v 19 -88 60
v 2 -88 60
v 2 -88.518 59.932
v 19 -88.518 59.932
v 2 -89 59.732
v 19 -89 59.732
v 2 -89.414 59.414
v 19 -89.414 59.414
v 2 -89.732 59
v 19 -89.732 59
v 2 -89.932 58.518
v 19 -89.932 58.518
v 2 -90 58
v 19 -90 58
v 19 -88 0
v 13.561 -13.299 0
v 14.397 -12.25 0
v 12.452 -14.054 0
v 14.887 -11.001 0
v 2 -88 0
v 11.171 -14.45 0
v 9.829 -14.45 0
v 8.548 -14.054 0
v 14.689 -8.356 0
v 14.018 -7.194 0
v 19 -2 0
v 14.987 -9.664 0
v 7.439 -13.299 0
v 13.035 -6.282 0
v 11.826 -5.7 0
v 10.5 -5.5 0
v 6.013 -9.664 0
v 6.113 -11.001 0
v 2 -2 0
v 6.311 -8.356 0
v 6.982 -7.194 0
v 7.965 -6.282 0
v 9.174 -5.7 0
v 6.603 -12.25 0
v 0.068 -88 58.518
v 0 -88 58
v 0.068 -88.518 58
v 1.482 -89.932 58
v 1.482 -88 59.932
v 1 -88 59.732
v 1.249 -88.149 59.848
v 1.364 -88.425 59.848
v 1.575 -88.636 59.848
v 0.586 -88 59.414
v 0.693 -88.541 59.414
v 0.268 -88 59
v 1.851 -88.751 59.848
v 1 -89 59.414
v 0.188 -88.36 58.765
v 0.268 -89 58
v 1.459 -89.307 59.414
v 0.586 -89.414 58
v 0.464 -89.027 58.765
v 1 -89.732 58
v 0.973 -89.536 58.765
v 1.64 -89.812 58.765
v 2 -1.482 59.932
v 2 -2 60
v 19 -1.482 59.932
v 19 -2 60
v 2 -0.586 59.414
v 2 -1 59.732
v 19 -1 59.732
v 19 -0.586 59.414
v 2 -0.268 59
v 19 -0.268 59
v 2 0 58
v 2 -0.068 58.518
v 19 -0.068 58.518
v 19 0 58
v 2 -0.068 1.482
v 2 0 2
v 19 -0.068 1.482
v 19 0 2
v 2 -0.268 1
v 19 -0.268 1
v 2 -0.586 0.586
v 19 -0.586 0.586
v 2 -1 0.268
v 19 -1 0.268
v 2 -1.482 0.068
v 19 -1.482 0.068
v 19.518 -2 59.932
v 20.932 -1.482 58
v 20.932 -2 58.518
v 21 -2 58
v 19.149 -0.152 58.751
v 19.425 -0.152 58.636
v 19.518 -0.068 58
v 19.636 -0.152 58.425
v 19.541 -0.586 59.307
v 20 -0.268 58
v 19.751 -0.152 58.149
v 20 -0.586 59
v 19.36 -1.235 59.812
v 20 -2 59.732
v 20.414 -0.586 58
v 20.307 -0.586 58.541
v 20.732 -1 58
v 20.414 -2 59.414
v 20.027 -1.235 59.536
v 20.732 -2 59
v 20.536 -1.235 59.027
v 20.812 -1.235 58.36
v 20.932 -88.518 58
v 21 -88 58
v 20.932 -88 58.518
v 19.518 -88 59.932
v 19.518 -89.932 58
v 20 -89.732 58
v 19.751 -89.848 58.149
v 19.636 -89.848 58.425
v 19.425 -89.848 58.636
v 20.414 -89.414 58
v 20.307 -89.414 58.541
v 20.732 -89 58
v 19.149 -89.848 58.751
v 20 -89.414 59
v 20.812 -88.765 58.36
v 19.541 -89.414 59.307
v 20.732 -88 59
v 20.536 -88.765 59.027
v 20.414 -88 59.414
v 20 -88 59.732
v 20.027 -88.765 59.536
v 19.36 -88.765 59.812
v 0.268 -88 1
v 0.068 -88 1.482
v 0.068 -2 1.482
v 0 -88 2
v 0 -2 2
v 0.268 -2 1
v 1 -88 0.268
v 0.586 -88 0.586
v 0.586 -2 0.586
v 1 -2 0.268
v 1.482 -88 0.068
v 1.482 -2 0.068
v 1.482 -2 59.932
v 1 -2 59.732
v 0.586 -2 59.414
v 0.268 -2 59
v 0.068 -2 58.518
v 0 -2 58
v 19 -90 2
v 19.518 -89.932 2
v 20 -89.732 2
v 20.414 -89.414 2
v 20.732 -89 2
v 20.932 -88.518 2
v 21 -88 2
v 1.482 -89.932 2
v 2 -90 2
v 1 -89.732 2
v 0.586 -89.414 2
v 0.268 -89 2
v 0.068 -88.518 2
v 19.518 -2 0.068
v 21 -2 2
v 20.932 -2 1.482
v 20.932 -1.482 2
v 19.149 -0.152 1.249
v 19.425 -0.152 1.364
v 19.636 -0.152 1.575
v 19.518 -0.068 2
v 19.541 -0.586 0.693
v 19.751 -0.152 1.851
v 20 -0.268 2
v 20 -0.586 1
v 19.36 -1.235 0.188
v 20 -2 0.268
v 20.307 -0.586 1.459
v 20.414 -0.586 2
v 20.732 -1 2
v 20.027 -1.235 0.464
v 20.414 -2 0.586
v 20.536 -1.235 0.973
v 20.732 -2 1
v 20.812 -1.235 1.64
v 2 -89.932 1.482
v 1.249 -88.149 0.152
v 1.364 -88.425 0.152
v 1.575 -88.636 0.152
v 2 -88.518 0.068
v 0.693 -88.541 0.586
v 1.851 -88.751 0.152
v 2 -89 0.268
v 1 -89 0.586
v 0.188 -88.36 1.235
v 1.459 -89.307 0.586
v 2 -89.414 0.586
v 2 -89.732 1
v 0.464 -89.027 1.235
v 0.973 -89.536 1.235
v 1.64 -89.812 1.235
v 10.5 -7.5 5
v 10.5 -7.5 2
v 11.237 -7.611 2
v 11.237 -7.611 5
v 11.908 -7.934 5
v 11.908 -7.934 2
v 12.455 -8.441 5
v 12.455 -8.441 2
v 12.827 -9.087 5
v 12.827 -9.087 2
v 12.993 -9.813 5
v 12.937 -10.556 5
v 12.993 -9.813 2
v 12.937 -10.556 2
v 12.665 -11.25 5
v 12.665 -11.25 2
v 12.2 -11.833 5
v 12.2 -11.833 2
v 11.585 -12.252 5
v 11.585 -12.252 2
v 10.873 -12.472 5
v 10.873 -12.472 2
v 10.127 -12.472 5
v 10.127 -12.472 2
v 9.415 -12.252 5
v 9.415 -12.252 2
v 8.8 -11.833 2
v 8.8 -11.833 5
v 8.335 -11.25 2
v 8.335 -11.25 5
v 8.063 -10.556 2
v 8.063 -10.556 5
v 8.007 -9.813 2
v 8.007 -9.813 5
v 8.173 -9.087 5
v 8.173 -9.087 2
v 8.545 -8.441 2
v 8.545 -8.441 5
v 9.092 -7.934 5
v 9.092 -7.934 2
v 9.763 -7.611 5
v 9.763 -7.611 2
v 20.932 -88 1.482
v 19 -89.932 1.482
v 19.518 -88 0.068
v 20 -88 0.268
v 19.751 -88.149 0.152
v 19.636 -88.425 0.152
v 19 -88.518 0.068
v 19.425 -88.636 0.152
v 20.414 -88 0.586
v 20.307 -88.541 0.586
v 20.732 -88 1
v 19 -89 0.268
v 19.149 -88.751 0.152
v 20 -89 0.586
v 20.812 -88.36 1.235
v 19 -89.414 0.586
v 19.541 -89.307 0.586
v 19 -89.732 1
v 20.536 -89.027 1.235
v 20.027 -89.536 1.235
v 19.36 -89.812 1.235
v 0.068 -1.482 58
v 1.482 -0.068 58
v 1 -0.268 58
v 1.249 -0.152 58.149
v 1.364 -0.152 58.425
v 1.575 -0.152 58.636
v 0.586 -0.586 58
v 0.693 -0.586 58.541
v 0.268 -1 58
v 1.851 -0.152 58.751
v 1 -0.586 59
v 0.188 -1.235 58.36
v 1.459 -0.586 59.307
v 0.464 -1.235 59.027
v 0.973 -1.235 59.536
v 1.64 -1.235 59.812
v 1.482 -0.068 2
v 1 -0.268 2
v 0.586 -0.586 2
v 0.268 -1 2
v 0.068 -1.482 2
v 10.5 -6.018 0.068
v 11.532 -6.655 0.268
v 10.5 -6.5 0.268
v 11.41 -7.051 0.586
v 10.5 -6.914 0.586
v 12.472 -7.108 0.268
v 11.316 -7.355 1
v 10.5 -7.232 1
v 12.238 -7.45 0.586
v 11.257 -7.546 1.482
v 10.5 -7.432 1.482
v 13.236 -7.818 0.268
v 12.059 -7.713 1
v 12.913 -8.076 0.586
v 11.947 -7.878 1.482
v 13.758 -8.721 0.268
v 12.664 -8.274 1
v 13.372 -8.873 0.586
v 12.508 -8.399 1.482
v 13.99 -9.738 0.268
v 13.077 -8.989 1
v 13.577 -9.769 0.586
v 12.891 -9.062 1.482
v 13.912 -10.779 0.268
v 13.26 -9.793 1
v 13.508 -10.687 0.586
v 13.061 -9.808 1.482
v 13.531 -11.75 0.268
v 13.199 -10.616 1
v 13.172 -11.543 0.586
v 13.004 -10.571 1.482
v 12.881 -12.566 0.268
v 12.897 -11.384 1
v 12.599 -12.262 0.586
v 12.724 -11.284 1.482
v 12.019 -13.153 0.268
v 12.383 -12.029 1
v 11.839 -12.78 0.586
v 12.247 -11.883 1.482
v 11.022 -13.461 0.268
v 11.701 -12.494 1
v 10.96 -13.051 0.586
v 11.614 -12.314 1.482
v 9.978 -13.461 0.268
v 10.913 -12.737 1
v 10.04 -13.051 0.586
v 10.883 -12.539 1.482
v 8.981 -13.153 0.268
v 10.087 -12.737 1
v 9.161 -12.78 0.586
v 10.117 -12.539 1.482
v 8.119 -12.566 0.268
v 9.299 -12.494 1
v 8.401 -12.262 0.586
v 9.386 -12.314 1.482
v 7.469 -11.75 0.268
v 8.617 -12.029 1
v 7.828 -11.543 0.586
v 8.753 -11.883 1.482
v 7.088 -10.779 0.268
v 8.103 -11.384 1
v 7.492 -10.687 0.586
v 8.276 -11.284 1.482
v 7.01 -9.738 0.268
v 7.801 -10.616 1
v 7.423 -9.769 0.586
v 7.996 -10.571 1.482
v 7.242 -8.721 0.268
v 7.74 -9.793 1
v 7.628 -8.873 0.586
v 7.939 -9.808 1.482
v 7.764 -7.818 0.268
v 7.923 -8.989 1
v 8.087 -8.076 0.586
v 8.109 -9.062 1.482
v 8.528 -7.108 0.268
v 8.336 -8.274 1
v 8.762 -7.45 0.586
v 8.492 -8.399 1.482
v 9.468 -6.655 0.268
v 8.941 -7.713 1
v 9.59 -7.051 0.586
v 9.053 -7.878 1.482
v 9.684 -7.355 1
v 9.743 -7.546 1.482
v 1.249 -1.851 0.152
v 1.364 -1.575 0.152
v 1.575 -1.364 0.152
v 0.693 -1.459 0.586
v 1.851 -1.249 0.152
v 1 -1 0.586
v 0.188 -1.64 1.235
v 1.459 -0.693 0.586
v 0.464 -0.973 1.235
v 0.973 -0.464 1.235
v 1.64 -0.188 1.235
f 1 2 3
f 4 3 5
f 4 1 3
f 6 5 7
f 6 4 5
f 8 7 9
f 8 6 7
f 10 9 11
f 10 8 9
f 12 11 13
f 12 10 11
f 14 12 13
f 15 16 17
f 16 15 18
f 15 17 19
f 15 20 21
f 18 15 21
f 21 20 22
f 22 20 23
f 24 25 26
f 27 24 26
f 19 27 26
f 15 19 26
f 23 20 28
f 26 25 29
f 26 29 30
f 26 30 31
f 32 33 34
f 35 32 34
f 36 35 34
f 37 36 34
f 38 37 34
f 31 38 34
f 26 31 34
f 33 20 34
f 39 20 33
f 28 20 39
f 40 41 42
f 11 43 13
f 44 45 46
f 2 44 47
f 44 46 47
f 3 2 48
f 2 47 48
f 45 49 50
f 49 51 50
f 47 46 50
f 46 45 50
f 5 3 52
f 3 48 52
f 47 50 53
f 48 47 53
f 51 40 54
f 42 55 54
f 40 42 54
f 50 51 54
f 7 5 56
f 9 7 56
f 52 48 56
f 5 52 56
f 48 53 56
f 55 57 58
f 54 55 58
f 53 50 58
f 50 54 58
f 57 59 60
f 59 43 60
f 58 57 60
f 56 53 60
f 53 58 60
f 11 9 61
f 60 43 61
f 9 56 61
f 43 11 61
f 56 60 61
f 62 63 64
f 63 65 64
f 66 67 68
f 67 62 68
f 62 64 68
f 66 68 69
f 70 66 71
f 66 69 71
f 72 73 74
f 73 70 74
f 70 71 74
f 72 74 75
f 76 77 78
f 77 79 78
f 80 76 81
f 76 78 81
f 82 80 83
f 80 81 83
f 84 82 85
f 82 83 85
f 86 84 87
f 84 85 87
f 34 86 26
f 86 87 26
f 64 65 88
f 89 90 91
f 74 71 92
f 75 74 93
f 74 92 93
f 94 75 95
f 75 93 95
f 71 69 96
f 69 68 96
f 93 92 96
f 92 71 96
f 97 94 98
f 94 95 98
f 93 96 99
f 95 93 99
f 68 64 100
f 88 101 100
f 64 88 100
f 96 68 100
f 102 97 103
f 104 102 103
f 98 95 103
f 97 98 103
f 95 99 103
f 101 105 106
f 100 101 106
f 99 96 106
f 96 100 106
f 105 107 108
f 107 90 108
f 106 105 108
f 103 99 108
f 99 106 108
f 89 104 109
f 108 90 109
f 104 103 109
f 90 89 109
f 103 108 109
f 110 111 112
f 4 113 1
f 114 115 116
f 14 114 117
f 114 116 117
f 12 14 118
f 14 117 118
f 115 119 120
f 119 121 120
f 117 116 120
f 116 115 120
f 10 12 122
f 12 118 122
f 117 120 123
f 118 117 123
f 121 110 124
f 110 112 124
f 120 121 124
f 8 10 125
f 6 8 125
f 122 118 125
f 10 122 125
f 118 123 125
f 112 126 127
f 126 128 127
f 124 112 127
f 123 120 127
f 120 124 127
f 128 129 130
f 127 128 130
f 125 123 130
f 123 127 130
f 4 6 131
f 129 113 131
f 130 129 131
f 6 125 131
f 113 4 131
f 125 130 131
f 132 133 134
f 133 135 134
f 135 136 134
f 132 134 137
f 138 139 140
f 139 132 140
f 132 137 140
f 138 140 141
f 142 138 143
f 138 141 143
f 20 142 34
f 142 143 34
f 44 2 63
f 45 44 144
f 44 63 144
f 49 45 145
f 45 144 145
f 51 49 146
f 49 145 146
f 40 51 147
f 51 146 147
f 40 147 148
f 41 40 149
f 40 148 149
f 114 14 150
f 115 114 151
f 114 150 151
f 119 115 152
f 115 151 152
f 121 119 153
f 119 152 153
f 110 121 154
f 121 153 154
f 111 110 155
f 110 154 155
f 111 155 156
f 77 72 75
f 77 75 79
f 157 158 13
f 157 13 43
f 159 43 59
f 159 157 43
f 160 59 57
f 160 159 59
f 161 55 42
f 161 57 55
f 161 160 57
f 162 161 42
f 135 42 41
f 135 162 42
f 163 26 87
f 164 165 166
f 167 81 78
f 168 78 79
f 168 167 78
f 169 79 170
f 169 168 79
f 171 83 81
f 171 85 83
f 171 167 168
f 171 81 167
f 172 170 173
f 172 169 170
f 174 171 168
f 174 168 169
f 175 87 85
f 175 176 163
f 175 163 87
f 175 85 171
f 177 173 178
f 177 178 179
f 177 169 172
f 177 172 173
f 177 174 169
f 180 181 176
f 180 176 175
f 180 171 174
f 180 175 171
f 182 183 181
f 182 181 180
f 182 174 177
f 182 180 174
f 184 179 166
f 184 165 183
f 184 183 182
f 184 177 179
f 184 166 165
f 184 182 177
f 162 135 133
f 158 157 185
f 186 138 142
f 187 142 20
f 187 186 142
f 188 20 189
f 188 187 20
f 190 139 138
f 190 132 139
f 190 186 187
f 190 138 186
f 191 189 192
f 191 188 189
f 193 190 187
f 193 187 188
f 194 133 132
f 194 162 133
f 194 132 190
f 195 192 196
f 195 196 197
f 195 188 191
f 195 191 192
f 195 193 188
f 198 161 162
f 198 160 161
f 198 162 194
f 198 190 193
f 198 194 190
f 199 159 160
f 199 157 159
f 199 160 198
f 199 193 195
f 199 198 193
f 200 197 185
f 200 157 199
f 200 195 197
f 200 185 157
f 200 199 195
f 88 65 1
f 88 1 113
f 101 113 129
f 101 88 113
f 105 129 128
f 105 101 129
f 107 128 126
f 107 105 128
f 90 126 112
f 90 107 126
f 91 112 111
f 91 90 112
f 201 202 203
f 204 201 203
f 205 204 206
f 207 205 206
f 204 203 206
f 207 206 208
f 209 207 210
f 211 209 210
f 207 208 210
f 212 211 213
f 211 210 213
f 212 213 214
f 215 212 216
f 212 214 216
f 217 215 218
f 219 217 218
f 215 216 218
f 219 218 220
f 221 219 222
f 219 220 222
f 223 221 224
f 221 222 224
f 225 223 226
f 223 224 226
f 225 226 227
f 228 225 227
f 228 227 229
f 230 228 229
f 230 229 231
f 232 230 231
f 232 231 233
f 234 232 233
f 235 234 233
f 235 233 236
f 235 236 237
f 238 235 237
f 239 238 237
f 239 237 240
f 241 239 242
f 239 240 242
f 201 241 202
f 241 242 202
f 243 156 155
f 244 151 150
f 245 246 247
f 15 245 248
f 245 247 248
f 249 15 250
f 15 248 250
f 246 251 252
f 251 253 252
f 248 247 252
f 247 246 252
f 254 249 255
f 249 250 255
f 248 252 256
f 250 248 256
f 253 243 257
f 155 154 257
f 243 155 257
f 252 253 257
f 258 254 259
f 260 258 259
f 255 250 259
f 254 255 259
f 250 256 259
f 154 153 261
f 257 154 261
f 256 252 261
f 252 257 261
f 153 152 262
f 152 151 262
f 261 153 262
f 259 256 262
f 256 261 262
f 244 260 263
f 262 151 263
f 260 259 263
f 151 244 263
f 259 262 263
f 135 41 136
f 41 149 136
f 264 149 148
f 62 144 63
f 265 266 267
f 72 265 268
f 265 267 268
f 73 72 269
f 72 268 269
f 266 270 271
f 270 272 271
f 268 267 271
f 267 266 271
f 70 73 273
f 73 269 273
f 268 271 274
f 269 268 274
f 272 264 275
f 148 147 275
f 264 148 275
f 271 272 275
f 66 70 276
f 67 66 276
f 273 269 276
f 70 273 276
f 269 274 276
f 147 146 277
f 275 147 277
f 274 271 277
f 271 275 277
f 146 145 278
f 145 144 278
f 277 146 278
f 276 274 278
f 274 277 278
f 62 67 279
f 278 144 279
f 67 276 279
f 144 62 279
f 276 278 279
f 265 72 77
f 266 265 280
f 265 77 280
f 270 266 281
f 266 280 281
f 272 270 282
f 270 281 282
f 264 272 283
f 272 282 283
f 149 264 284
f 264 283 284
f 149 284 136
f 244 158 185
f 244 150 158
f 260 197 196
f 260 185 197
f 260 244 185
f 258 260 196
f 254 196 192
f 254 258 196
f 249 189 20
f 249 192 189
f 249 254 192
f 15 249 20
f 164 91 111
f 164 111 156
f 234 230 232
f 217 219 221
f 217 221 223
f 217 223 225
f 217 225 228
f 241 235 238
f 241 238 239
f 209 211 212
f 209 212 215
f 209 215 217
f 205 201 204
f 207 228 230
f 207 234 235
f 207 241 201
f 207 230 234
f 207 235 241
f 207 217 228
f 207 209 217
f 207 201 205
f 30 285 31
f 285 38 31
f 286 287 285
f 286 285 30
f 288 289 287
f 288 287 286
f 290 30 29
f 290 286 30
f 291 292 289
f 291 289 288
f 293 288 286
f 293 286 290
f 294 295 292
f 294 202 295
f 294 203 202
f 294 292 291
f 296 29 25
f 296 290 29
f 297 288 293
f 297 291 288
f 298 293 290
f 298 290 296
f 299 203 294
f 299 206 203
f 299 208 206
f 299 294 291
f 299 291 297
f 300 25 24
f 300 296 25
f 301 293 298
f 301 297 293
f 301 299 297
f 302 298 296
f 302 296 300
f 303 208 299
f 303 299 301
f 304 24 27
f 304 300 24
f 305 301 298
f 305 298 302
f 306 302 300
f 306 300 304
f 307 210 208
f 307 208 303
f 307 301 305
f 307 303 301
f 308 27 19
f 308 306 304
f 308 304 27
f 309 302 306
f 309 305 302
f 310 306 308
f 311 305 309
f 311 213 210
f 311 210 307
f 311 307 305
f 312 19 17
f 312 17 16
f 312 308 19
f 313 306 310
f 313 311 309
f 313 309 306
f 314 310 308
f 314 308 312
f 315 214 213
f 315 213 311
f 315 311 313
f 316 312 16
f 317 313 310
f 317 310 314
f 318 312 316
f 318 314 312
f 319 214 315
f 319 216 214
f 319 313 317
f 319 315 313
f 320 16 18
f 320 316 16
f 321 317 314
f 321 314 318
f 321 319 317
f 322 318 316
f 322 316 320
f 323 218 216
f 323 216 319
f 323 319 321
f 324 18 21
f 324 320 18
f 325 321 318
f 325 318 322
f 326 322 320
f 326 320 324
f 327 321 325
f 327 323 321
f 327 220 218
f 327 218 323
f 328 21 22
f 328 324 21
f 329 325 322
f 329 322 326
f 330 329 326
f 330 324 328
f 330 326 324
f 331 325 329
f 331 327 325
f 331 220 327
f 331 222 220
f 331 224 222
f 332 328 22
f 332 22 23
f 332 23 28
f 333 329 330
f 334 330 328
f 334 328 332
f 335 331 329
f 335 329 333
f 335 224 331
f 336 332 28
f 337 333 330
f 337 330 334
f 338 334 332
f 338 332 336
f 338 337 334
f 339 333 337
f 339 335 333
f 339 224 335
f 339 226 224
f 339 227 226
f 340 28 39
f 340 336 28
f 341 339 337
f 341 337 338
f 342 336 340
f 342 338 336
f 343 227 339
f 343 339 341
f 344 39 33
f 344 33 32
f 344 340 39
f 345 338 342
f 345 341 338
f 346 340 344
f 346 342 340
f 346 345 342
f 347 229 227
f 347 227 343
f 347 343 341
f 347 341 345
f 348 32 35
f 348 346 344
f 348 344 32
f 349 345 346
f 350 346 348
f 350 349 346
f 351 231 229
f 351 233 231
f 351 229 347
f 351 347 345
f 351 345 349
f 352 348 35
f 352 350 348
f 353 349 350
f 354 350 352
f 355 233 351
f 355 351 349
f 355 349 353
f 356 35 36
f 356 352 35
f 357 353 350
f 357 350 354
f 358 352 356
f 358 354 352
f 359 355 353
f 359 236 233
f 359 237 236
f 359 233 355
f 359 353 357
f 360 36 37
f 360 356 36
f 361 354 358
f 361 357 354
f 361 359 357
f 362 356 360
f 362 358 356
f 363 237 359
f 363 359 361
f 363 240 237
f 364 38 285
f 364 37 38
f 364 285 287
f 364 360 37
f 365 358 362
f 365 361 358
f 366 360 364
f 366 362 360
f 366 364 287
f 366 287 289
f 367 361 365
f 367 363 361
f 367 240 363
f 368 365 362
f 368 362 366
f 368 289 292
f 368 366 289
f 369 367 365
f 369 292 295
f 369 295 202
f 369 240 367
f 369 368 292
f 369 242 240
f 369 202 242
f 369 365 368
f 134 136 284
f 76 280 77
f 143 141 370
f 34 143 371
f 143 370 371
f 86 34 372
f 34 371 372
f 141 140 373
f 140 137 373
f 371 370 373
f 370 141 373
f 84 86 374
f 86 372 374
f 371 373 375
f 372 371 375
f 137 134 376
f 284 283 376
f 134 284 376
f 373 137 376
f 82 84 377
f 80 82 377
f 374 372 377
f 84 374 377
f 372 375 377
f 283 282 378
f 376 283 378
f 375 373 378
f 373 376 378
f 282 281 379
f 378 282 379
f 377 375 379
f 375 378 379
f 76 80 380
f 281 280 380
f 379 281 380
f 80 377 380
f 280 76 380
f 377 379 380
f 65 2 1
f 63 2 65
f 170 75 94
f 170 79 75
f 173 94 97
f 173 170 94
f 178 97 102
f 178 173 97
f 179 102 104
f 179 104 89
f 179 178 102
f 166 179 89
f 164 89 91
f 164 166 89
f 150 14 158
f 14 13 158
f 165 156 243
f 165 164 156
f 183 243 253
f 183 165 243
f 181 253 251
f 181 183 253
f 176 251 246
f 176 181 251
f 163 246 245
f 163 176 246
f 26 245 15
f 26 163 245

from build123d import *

# Parameters (mm, degrees)
SKETCH_1_W          = 60
SKETCH_1_H          = 90
EXTRUDE_1_DEPTH     = 21
SKETCH_2_R          = 2.5
CUT_EXTRUDE_1_DEPTH = 5
FILLET_2_R          = 2


with BuildPart() as part:
    # 草图1 → 凸台-拉伸1 (new body)
    with BuildSketch(Plane(origin=(0, 0, 0), x_dir=(0, 0, -1), z_dir=(1, 0, 0))):
        with Locations((-30, -45)):
            Rectangle(SKETCH_1_W, SKETCH_1_H)
    extrude(amount=EXTRUDE_1_DEPTH)

    # 草图2 → 切除-拉伸1 (cut)
    with BuildSketch(Plane(origin=(0, 0, 0), x_dir=(-1, 0, 0), z_dir=(0, 0, -1))):
        with Locations(Location((-10.5, -10, 0), (0, 0, 90))):
            Circle(SKETCH_2_R)
    extrude(amount=-CUT_EXTRUDE_1_DEPTH, mode=Mode.SUBTRACT)

    # 圆角2
    fillet_2_edges = [part.edges().sort_by_distance(p)[0] for p in [
        (21, -45, 60),
        (10.5, -12.5, 0),
        (21, -90, 30),
        (21, -45, 0),
        (0, -90, 30),
        (0, -45, 60),
        (0, 0, 30),
        (0, -45, 0),
        (10.5, -90, 0),
        (10.5, -90, 60),
        (10.5, 0, 60),
        (10.5, 0, 0),
        (21, 0, 30),
    ]]
    fillet(fillet_2_edges, radius=FILLET_2_R)


solid = part.part
